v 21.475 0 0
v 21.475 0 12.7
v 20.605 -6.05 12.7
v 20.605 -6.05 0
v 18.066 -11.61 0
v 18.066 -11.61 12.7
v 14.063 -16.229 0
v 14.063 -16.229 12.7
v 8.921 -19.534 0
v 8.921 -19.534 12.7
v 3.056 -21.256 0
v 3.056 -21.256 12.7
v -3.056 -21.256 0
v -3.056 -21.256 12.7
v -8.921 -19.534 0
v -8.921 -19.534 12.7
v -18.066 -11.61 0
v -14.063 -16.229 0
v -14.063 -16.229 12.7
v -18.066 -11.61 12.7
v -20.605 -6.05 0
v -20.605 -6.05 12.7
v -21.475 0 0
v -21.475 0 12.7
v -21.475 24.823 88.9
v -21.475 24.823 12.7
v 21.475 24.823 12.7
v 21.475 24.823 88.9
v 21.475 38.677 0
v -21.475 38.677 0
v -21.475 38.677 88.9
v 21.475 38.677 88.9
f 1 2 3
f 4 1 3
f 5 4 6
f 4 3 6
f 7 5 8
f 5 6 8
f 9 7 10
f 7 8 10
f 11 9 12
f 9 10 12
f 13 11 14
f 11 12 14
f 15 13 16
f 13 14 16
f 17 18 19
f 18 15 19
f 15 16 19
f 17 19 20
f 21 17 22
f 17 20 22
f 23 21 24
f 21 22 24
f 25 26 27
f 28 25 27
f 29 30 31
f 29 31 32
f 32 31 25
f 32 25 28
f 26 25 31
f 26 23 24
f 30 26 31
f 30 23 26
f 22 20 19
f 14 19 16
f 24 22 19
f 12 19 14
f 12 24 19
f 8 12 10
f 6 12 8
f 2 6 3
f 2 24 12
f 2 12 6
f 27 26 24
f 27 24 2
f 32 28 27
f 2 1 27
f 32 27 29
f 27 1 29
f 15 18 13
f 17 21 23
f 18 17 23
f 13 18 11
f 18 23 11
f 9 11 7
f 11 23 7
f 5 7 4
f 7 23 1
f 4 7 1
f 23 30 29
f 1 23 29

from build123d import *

# Parameters (mm, degrees)
F0_W     = 42.949088
F0_H     = 77.354542
F1_DEPTH = 12.7
F3_DEPTH = 25.4
F4_W     = 42.949088
F4_H     = 13.854544
F5_DEPTH = 76.2


with BuildPart() as f1:
    # F0 (on Top) → F1 (new body)
    with BuildSketch(Plane.XY):
        Rectangle(F0_W, F0_H)
    extrude(amount=F1_DEPTH)

    # F2 (on face) → F3 (cut)
    with BuildSketch(Plane.XY.offset(12.7)):
        with BuildLine():
            ThreePointArc((21.474544, 0), (0, -21.474544), (-21.474544, 0))
            Line((-21.474544, 0), (-21.474544, -38.677271))
            Line((-21.474544, -38.677271), (21.474544, -38.677271))
            Line((21.474544, -38.677271), (21.474544, 0))
        make_face()
    extrude(amount=-F3_DEPTH, mode=Mode.SUBTRACT)

    # F4 (on face) → F5 (join)
    with BuildSketch(Plane.XY.offset(12.7)):
        with Locations((0, 31.749999)):
            Rectangle(F4_W, F4_H)
    extrude(amount=F5_DEPTH)


solid = f1.part
